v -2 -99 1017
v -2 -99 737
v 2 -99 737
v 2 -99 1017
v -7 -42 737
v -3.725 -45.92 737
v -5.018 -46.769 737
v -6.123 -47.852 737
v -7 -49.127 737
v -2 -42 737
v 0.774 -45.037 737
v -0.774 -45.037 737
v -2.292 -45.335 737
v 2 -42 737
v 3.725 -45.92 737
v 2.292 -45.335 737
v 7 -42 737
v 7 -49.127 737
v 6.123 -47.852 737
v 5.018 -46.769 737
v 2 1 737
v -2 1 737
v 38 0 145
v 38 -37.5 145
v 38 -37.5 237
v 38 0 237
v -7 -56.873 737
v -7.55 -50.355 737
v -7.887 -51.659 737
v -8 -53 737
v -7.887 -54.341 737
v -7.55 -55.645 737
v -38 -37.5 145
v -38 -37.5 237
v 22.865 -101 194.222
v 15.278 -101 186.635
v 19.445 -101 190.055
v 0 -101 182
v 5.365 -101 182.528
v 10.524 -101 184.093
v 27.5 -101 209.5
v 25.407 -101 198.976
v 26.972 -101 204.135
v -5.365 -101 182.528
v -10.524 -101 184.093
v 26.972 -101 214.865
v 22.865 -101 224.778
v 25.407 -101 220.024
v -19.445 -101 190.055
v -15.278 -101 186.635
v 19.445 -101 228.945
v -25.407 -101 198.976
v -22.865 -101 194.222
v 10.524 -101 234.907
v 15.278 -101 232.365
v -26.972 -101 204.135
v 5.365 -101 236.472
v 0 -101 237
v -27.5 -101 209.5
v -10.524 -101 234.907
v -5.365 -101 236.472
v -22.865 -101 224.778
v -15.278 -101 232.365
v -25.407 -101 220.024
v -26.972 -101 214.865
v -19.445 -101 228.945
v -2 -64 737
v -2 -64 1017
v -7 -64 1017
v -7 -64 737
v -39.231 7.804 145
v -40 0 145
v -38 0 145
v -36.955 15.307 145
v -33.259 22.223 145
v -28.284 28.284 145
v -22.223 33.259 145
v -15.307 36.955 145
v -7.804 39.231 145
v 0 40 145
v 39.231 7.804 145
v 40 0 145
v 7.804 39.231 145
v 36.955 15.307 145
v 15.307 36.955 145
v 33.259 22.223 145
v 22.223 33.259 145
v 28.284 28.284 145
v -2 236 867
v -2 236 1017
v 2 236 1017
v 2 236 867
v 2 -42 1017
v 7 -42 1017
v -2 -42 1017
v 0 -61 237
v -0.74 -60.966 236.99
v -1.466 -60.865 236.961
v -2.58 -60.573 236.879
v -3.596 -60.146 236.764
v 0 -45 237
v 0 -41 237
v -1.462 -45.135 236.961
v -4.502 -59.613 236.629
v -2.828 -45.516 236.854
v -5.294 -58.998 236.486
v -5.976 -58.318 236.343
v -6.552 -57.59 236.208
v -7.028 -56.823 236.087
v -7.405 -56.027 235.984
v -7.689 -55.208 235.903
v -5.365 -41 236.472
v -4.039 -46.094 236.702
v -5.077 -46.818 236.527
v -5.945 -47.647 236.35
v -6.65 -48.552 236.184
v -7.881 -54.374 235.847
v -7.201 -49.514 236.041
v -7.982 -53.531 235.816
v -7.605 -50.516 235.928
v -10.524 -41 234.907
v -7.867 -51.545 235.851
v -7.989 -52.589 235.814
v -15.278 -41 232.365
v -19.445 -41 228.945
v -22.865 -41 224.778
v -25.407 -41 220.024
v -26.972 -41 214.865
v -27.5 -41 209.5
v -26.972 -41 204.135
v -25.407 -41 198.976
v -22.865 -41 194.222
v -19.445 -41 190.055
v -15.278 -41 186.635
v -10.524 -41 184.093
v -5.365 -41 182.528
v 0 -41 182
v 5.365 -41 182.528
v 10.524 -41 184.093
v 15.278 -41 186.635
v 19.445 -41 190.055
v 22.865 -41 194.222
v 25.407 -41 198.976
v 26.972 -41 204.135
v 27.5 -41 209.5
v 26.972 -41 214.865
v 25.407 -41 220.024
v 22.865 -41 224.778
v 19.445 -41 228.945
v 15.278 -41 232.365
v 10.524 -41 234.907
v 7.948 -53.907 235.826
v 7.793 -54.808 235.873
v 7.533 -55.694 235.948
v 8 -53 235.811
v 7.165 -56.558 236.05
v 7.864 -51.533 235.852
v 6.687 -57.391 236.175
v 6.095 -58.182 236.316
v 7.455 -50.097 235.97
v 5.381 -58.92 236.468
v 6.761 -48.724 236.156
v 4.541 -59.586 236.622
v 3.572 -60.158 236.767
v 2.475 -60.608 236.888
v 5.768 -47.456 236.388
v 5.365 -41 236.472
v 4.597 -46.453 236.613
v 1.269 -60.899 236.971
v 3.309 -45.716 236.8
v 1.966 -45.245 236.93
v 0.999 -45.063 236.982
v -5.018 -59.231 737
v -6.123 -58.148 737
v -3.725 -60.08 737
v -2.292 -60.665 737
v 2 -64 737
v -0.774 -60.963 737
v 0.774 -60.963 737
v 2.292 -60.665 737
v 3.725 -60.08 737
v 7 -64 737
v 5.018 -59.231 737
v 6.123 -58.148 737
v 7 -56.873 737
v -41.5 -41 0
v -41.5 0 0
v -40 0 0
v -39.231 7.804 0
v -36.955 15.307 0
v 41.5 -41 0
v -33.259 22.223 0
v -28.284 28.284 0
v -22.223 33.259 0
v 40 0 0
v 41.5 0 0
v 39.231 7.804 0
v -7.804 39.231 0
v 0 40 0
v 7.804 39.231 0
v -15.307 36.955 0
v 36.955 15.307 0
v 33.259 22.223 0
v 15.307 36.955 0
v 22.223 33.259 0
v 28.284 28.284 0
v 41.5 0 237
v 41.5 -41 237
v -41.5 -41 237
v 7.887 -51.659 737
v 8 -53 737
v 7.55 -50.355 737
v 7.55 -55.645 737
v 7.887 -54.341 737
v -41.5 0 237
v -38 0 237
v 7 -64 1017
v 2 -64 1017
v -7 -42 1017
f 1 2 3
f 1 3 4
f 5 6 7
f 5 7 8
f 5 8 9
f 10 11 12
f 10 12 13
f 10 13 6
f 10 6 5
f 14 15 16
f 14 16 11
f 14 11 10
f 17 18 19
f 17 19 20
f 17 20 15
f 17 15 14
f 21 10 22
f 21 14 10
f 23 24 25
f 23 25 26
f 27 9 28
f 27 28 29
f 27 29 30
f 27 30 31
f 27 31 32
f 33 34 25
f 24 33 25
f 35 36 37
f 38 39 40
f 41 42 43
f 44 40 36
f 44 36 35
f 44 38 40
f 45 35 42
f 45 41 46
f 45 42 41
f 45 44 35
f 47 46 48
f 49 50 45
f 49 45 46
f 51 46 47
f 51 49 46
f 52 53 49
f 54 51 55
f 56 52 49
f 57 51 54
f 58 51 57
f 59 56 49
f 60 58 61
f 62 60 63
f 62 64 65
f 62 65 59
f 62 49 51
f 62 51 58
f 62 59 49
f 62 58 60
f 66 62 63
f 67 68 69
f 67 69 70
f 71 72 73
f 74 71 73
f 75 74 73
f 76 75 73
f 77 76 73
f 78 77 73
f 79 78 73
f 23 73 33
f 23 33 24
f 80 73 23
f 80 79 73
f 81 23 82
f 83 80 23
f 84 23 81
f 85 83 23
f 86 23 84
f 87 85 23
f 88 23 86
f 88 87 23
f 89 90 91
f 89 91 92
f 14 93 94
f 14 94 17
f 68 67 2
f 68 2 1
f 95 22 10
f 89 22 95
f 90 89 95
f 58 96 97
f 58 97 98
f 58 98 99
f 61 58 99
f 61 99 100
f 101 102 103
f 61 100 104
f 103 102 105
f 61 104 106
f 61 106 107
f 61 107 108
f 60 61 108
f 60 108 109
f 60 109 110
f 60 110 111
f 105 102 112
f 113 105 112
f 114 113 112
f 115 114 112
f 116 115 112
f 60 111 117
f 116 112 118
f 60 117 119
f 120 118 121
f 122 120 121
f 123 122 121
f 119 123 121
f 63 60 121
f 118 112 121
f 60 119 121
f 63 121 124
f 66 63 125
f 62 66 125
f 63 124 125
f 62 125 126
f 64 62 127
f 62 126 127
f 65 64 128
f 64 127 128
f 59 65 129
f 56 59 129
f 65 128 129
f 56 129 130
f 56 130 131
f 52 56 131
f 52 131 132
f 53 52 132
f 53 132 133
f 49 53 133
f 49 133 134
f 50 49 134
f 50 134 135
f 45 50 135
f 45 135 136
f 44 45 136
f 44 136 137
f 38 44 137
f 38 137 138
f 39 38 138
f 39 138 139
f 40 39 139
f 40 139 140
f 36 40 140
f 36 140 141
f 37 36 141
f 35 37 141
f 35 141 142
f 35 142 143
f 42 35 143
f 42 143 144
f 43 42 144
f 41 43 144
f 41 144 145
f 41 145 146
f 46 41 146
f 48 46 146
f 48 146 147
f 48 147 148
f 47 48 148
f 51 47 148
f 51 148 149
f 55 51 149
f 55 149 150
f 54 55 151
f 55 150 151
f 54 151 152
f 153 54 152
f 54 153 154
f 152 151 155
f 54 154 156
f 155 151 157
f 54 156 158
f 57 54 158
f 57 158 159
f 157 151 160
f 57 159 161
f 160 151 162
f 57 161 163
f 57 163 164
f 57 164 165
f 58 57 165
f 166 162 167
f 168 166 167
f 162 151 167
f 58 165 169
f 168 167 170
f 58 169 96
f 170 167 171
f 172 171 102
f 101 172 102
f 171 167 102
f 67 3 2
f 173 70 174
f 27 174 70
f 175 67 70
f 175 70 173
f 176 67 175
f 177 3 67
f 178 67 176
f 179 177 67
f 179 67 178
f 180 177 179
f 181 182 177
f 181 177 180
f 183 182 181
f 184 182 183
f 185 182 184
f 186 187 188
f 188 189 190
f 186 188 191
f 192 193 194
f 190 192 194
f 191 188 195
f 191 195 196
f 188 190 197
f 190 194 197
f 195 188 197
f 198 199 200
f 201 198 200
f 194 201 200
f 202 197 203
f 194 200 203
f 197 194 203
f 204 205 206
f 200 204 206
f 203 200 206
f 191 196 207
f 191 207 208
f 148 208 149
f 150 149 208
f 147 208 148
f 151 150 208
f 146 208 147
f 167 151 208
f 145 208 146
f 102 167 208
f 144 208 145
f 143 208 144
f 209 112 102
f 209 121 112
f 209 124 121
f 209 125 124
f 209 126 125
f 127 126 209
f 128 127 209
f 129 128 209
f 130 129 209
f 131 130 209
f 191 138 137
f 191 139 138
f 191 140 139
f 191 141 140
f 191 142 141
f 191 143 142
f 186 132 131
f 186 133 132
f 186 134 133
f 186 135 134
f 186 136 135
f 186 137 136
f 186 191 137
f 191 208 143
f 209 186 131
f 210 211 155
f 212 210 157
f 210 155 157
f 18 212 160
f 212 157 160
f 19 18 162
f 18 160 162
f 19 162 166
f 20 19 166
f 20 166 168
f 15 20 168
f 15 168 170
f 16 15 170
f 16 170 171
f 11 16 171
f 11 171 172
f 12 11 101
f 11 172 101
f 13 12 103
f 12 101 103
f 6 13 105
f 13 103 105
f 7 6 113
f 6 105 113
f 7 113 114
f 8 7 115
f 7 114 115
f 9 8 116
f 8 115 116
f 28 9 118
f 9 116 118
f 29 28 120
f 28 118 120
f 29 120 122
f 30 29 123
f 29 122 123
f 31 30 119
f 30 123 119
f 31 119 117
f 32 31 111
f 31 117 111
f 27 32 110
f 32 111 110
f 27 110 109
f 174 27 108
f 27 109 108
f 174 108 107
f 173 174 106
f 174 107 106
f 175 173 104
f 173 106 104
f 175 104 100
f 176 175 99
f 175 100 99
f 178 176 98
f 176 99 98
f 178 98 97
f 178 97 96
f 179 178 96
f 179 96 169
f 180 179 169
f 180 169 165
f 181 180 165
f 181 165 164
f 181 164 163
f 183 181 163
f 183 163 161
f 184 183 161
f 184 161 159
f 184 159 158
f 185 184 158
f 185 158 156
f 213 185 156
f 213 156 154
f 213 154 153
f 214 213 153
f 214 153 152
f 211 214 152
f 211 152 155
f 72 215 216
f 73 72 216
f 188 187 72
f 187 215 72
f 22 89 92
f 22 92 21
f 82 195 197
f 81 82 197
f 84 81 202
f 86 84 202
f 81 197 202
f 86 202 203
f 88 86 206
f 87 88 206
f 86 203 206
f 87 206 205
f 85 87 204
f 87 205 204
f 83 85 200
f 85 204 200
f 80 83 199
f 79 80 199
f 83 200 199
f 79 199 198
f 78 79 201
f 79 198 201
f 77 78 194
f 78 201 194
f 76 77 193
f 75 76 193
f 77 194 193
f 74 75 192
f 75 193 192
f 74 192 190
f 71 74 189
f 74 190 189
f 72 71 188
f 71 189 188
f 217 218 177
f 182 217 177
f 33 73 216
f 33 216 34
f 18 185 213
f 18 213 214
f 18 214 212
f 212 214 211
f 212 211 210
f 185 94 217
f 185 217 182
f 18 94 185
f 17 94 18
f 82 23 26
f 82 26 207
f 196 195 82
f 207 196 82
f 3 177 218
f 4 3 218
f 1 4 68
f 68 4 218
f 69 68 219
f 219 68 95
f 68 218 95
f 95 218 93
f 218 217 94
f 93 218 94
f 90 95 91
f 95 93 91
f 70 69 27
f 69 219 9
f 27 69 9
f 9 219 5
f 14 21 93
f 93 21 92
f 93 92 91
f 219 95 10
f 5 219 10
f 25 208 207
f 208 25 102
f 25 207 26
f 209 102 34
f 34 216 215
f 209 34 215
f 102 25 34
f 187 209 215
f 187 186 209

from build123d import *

# Parameters (mm, degrees)
P_IDAT_VYSUNUT_M1_DEPTH      = 145
P_IDAT_VYSUNUT_M2_DEPTH      = 92
SKICA3_R                     = 27.5
P_IDAT_VYSUNUT_M3_DEPTH      = 60
P_IDAT_VYSUNUT_M4_DEPTH      = 500
P_IDAT_VYSUNUT_M4_DEPTH_BACK = 40
SKICA4_R                     = 8
P_IDAT_VYSUNUT_M5_DEPTH      = 2
P_IDAT_VYSUNUT_M5_DEPTH_BACK = 2
SKICA6_W                     = 280
SKICA6_H                     = 22
P_IDAT_VYSUNUT_M6_DEPTH      = 5


with BuildPart() as part:
    # Skica1 → Přidat vysunutím1 (new body)
    with BuildSketch(Plane.XY):
        with BuildLine():
            Line((-41.5, 0), (-41.5, -41))
            Line((-41.5, -41), (41.5, -41))
            Line((41.5, -41), (41.5, 0))
            Line((41.5, 0), (40, 0))
            ThreePointArc((40, 0), (0, 40), (-40, 0))
            Line((-40, 0), (-41.5, 0))
        make_face()
    extrude(amount=P_IDAT_VYSUNUT_M1_DEPTH)

    # Skica2 → Přidat vysunutím2 (add)
    with BuildSketch(Plane.XY.offset(145)):
        Polygon((-41.5, 0), (-38, 0), (-38, -37.5), (38, -37.5), (38, 0), (41.5, 0), (41.5, -41), (-41.5, -41), align=None)
    extrude(amount=P_IDAT_VYSUNUT_M2_DEPTH)

    # Skica3 → Přidat vysunutím3 (add)
    with BuildSketch(Plane.XZ.offset(41)):
        with Locations(Location((0, 209.5, 0), (0, 0, 90))):
            Circle(SKICA3_R)
    extrude(amount=P_IDAT_VYSUNUT_M3_DEPTH)

    # Skica4 → Přidat vysunutím4 (add, two sides: drawn at the far end of the back side and taken through both)
    with BuildSketch(Plane.XY.offset(237).offset(-P_IDAT_VYSUNUT_M4_DEPTH_BACK)):
        with Locations((0, -53)):
            Circle(SKICA4_R)
    extrude(amount=P_IDAT_VYSUNUT_M4_DEPTH + P_IDAT_VYSUNUT_M4_DEPTH_BACK)

    # Skica5 → Přidat vysunutím5 (add, two sides: drawn at the far end of the back side and taken through both)
    with BuildSketch(Plane(origin=(0, 0, 0), x_dir=(0, 0, -1), z_dir=(1, 0, 0)).offset(-P_IDAT_VYSUNUT_M5_DEPTH_BACK)):
        Polygon((-737, 1), (-737, -99), (-1017, -99), (-1017, 236), (-867, 236), align=None)
    extrude(amount=P_IDAT_VYSUNUT_M5_DEPTH + P_IDAT_VYSUNUT_M5_DEPTH_BACK)

    # Skica6 → Přidat vysunutím6 (add)
    with BuildSketch(Plane(origin=(2, 0, 0), x_dir=(0, 0, -1), z_dir=(1, 0, 0))):
        with Locations((-877, -53)):
            Rectangle(SKICA6_W, SKICA6_H)
    p_idat_vysunut_m6 = extrude(amount=P_IDAT_VYSUNUT_M6_DEPTH)

    # Zrcadlit1: Přidat vysunutím6 across plane
    add(p_idat_vysunut_m6.mirror(Plane(origin=(0, 0, 0), x_dir=(0, 0, 1), z_dir=(1, 0, 0))))


solid = part.part
